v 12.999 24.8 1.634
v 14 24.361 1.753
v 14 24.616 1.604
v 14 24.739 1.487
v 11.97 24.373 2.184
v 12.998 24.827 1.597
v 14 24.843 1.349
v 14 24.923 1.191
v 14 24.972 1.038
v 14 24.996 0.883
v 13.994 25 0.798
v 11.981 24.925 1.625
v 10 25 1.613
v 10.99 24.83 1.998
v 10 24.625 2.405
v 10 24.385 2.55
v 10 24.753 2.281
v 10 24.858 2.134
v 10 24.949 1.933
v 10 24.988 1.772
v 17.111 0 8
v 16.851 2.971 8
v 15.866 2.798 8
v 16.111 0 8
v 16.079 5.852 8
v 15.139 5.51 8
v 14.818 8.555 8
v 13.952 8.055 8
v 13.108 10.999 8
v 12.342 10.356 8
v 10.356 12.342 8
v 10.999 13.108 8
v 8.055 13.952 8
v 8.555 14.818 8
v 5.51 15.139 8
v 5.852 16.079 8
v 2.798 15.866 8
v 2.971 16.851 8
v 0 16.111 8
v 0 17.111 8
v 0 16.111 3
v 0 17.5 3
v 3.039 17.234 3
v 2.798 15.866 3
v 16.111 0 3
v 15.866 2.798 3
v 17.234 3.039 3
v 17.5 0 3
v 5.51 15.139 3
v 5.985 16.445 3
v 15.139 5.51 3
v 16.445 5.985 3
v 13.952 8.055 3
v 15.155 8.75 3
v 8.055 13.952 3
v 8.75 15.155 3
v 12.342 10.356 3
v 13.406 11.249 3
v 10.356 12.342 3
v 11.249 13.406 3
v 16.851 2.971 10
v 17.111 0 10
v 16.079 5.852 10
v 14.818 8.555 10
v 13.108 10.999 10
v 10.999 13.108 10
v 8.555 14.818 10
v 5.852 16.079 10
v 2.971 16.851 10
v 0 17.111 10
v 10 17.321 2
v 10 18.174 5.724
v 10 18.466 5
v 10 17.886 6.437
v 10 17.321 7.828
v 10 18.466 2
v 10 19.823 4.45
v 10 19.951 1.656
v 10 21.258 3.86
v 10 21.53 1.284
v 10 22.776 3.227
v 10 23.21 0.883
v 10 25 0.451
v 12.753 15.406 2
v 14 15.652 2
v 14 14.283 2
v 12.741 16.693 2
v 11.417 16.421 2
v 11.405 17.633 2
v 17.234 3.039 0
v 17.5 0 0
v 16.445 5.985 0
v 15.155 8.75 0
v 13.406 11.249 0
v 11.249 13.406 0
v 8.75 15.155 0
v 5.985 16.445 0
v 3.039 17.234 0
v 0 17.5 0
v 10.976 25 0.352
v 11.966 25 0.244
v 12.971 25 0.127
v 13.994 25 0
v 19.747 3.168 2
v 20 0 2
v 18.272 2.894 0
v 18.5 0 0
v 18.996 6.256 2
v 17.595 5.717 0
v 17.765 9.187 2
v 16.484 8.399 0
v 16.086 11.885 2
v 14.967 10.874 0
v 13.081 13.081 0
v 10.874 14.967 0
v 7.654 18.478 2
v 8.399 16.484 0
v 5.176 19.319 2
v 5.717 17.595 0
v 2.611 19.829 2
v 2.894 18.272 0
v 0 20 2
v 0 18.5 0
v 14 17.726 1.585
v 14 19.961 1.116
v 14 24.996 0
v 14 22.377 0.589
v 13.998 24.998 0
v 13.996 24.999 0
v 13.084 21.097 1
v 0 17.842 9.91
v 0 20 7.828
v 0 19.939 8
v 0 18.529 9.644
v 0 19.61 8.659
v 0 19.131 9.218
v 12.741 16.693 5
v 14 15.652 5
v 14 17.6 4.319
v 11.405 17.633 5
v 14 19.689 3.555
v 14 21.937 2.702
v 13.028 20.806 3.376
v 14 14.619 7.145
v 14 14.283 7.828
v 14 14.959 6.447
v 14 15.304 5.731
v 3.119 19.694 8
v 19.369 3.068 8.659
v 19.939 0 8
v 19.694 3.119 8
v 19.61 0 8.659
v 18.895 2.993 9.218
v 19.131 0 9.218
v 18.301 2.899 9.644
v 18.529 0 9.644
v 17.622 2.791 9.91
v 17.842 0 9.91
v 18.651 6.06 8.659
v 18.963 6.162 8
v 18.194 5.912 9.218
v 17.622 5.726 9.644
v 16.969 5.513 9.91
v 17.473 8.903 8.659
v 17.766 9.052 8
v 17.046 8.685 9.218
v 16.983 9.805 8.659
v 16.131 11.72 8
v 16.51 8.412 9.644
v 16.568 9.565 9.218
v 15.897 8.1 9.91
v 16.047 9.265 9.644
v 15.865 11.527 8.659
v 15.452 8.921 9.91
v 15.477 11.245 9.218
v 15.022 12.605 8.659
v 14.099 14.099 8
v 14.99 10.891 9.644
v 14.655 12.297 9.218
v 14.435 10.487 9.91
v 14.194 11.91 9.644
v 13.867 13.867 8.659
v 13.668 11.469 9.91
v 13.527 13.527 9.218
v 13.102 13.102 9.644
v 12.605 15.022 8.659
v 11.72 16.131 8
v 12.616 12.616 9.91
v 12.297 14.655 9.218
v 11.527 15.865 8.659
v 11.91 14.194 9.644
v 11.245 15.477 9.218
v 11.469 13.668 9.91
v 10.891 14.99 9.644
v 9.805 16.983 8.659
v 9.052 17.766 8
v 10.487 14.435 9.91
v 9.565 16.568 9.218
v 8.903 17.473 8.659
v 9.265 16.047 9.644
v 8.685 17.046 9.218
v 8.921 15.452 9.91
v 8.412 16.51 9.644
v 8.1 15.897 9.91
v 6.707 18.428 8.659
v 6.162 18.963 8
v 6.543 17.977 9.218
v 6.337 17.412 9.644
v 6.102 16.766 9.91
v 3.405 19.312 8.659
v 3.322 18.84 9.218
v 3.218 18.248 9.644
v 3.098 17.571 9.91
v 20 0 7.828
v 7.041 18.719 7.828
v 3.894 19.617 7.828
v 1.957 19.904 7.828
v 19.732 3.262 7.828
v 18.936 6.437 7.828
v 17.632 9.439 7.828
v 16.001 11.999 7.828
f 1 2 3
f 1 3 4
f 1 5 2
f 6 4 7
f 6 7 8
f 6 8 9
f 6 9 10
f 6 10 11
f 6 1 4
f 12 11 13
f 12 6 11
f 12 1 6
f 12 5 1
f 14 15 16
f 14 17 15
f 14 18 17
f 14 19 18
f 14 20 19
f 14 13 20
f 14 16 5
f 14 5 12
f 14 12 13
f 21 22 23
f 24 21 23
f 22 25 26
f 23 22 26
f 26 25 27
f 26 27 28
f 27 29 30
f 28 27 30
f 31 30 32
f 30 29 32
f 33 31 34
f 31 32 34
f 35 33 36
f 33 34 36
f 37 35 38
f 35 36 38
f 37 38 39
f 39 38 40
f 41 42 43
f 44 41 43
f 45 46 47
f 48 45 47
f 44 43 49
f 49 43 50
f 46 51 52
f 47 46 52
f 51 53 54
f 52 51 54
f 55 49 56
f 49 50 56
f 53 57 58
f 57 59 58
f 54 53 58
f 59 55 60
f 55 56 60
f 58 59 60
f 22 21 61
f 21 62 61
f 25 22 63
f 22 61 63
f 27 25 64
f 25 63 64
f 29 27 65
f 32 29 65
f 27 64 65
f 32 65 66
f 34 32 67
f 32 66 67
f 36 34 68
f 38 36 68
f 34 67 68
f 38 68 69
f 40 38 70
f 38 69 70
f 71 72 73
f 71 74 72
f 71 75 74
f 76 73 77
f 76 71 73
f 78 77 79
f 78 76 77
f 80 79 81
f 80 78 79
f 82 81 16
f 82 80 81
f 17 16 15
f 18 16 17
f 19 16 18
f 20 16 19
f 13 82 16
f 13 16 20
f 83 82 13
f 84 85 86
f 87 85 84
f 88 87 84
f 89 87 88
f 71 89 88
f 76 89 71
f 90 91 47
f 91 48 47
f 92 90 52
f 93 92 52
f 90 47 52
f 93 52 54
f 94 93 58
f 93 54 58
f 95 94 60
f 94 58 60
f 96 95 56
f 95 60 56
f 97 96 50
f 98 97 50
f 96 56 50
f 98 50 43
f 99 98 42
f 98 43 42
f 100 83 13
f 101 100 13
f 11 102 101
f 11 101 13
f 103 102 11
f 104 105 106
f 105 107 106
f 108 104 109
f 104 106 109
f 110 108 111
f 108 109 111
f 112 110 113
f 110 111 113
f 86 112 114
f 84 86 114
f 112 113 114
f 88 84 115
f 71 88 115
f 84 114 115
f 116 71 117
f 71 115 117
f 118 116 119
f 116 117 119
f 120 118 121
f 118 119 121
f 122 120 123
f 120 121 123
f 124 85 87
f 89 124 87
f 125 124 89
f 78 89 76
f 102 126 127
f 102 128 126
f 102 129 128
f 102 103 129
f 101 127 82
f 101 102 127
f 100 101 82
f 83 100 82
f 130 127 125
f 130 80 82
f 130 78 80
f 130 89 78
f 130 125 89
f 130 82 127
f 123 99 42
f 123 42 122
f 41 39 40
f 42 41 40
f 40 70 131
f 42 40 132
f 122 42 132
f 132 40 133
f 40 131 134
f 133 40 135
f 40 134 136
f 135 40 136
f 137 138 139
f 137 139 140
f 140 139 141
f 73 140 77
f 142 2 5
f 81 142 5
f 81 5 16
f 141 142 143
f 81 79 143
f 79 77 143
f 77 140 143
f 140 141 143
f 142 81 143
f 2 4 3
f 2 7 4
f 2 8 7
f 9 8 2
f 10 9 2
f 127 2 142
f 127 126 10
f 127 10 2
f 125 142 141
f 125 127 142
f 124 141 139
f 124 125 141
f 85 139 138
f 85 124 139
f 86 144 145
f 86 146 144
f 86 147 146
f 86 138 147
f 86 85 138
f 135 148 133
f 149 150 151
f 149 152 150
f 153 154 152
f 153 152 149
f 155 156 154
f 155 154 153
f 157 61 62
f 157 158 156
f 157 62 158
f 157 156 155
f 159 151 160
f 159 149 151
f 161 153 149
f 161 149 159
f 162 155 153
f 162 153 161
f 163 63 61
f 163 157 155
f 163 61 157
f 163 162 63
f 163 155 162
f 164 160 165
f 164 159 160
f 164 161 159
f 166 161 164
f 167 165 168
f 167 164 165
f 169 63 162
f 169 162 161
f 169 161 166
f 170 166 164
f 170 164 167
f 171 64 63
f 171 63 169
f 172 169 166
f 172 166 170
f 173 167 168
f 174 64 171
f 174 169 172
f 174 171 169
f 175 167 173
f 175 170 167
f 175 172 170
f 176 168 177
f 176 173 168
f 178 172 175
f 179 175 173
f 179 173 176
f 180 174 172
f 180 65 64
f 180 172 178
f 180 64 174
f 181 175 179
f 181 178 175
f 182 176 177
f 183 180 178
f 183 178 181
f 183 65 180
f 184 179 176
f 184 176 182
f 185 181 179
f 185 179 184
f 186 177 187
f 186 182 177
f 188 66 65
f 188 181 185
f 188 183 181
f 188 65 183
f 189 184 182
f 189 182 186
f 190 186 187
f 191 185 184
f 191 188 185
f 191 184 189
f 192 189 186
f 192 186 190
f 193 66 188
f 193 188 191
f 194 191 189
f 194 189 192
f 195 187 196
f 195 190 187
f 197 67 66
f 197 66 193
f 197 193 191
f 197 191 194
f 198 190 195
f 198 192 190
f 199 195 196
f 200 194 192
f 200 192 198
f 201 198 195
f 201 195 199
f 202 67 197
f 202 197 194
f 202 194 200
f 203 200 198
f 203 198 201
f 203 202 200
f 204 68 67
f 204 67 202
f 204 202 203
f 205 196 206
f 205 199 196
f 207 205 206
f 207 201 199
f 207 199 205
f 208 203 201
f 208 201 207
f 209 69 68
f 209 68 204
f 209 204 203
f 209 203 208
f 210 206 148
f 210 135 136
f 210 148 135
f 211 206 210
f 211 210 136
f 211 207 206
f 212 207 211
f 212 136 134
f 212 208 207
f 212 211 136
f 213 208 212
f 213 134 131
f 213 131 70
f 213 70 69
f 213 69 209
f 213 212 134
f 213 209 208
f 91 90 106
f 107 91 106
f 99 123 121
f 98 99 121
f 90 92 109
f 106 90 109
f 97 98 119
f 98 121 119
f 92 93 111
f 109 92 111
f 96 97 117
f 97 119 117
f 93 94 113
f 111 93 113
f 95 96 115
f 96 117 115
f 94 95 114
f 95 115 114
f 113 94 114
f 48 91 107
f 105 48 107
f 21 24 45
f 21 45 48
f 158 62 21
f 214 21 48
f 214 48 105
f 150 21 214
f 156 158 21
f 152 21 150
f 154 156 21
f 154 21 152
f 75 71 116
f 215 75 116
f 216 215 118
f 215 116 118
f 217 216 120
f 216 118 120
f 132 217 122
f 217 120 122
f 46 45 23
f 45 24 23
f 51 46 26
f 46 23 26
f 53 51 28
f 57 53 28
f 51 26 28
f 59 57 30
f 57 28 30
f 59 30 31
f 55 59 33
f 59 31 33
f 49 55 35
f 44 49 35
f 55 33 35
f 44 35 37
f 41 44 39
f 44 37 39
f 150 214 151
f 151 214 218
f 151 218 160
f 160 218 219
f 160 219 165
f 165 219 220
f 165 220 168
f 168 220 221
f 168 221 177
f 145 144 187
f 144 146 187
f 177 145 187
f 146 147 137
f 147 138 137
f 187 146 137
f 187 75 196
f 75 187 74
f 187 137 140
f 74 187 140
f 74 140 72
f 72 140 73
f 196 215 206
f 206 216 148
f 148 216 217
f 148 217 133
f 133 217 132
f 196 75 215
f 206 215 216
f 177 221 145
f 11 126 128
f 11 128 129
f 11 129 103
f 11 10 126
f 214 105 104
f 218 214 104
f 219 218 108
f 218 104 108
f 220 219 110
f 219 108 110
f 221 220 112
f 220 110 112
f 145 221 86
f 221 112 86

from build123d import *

# Parameters (mm, degrees)
REVOLUTION_ANGLE = 90
POCKET_DEPTH     = 10.001
FILLET_R         = 1


with BuildPart() as part:
    # Sketch001 → Revolution (revolve)
    with BuildSketch(Plane.XZ):
        with BuildLine():
            ThreePointArc((19.93934, 8), (18.842964, 9.44949), (17.110913, 10))
            Line((17.110913, 8), (17.110913, 10))
            Line((16.110913, 8), (17.110913, 8))
            Line((16.110913, 3), (16.110913, 8))
            Line((17.5, 3), (16.110913, 3))
            Line((17.5, 0), (17.5, 3))
            Line((18.5, 0), (17.5, 0))
            Line((20, 2), (18.5, 0))
            Line((20, 2), (21, 2))
            Line((21, 2), (28.65, 0))
            Line((28.65, 1.5), (28.65, 0))
            Line((21, 5), (28.65, 1.5))
            Line((19.93934, 8), (21, 5))
        make_face()
    revolve(axis=Axis((0, 0, 0), (0, 0, 1)), revolution_arc=REVOLUTION_ANGLE)

    # Sketch002 → Pocket (cut, through all)
    with BuildSketch(Plane.XY):
        with BuildLine():
            Line((10, 17.320508), (10, 25))
            Line((10, 25), (14, 25))
            Line((14, 25), (14, 14.282857))
            ThreePointArc((20, 0), (18.439089, 7.745967), (14, 14.282857))
            Line((37.402618, 0), (20, 0))
            Line((37.402618, 41.95618), (37.402618, 0))
            Line((0, 41.95618), (37.402618, 41.95618))
            Line((0, 20), (0, 41.95618))
            ThreePointArc((10, 17.320508), (5.176381, 19.318517), (0, 20))
        make_face()
    extrude(amount=POCKET_DEPTH, mode=Mode.SUBTRACT)

    # Fillet
    fillet_edges = [part.edges().sort_by_distance(p)[0] for p in [
        (12.001906, 25, 1.920149),
    ]]
    fillet(fillet_edges, radius=FILLET_R)


solid = part.part
